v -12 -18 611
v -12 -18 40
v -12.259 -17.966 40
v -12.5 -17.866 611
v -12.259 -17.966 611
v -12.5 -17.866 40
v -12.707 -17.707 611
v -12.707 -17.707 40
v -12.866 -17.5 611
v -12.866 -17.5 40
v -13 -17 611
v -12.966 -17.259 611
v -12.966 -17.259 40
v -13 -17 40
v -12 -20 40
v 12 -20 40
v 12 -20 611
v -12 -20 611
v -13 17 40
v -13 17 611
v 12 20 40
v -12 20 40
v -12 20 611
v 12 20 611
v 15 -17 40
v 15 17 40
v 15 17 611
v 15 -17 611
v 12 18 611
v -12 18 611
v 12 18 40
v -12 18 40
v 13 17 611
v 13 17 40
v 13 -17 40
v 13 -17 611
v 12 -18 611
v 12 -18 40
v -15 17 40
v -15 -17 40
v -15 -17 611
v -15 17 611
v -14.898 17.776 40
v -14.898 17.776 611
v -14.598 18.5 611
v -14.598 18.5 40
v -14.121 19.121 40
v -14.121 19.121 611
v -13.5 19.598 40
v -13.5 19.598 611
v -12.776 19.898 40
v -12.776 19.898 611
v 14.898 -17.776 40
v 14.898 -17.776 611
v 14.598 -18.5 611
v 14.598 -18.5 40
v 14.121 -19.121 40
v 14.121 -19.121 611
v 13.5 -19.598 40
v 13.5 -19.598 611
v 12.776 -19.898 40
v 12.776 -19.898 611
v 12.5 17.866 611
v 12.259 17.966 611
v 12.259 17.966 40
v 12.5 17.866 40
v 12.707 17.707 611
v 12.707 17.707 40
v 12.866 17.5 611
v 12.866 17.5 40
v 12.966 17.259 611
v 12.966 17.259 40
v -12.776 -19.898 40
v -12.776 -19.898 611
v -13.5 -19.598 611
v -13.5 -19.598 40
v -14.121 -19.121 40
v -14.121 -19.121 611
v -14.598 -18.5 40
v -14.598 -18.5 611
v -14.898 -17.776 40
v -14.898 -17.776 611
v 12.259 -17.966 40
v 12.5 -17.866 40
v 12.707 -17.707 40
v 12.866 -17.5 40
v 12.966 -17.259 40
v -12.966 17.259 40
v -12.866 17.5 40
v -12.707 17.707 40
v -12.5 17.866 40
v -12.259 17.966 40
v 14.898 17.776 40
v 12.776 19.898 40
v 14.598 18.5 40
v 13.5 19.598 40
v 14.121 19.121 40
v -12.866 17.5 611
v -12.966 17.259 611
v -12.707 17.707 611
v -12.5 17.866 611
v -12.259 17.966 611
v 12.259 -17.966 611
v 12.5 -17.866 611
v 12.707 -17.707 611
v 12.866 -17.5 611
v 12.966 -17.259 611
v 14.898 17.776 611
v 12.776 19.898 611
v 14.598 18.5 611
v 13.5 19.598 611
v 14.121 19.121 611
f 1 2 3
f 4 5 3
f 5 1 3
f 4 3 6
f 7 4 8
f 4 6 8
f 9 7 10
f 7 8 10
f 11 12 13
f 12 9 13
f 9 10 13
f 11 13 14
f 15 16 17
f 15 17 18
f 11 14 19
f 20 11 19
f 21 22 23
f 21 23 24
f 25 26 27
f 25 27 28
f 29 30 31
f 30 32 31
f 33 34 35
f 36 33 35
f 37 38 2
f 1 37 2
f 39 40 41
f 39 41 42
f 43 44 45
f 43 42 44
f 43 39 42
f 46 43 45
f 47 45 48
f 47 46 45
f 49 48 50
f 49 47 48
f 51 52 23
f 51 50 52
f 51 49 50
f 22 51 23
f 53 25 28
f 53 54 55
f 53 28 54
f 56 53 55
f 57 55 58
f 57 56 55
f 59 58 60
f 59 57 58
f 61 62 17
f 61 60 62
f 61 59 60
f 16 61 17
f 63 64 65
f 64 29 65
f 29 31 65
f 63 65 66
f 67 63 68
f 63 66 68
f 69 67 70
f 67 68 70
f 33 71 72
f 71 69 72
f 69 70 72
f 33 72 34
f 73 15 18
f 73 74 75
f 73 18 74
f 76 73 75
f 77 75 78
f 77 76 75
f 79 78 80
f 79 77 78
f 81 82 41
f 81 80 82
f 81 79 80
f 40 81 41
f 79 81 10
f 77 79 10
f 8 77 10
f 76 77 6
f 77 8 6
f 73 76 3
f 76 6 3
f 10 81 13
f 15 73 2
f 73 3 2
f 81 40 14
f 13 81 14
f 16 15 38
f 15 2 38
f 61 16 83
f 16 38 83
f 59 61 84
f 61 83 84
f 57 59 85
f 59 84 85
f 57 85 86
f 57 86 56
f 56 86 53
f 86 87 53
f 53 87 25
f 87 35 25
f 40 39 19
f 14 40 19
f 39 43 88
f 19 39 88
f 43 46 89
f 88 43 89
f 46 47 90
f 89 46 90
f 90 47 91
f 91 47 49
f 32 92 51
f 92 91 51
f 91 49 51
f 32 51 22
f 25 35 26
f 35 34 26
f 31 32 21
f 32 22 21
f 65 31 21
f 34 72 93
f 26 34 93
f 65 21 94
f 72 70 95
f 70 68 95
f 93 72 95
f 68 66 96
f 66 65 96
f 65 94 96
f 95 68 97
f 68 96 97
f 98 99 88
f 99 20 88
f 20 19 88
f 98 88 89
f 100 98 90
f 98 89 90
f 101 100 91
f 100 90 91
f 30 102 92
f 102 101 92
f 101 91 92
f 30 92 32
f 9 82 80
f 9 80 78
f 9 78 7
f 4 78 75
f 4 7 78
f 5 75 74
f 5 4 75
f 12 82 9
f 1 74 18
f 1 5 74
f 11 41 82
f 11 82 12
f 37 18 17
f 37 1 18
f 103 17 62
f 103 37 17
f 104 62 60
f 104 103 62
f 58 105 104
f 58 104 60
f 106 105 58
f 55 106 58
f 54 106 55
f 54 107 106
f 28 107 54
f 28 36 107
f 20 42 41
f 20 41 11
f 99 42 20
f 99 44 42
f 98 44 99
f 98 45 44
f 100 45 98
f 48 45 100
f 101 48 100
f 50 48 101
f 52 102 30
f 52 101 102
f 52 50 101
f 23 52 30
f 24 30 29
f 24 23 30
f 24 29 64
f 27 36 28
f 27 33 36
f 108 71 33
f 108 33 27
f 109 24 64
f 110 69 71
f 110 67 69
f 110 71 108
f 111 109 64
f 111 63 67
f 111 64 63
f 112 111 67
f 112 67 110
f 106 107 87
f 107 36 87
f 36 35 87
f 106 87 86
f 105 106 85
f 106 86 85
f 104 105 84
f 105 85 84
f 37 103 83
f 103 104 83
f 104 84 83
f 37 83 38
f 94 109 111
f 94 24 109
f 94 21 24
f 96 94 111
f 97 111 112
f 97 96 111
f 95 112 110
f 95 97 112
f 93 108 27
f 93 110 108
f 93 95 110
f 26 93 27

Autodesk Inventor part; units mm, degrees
ref_plane "Start plane" through (0, 0, 40) normal (0, 0, 1) x (1, 0, 0)
ref_plane "End plane" through (0, 0, 611) normal (0, 0, 1) x (1, 0, 0)
sketch "Sketch" plane through (0, 0, 0) normal (0, 0, 1) x (1, 0, 0)
  line L0 (-15, -17) -> (-15, 17)
  line L1 (-12, 20) -> (12, 20)
  line L2 (15, 17) -> (15, -17)
  line L3 (12, -20) -> (-12, -20)
  arc A0 (-15, -17) -> (-12, -20) centre (-12, -17) ccw
  arc A1 (-12, 20) -> (-15, 17) centre (-12, 17) ccw
  arc A2 (15, 17) -> (12, 20) centre (12, 17) ccw
  arc A3 (12, -20) -> (15, -17) centre (12, -17) ccw
  arc A4 (-12, 18) -> (-13, 17) centre (-12, 17) ccw
  line L4 (-12, 18) -> (12, 18)
  arc A5 (13, 17) -> (12, 18) centre (12, 17) ccw
  line L5 (13, 17) -> (13, -17)
  arc A6 (12, -18) -> (13, -17) centre (12, -17) ccw
  line L6 (12, -18) -> (-12, -18)
  arc A7 (-13, -17) -> (-12, -18) centre (-12, -17) ccw
  line L7 (-13, -17) -> (-13, 17)
  line L8 (0, 28.8698) -> (0, -28.8698) construction
  line L9 (-14.8698, 0) -> (14.8698, 0) construction
  dimension "d7" = 3
  dimension "d10" = 40
  dimension "d11" = 30
  dimension "d12" = 2
  dimension "d15" = 20
  dimension "d16" = 15
extrude "Body" add sketch "Sketch" along normal up to surface (571 mm away) from surface at 40
sketch "Sketch3" plane through (0, 0, 0) normal (0, 0, 1) x (1, 0, 0)
  line L0 (0, 0) -> (10, 0)
ref_plane "Work Plane3" through (0, 0, 0) normal (0, -1, 0) x (1, 0, 0)
sketch "Sketch4" plane through (0, 0, 0) normal (0, -1, 0) x (1, 0, 0)
  line L0 (-2, 40) -> (12, 40)
  line L1 (-2, 611) -> (12, 611)
  dimension "d18" = 571
ref_plane "Work Plane4" through (7, -310, 40) normal (0, 0, -1) x (-1, 0, 0)
split "Split1" plane through (7, -310, 40) removes the side toward (0, 0, -1)
ref_plane "Work Plane5" through (-37, -100, 611) normal (0, 0, 1) x (1, 0, 0)
split "Split2" plane through (-37, -100, 611) removes the side toward (0, 0, 1)
equation "\"d7\" = G_IR"
equation "\"d10\" = G_H"
equation "\"d11\" = G_W"
equation "\"d12\" = G_T"
equation "\"d15\" = 0.5 * d10"
equation "\"d16\" = 0.5 * d11"
equation "\"d3\" = G_L"
equation "\"G_W\" = 30"
equation "\"G_H\" = 40"
equation "\"G_T\" = 2"
equation "\"G_IR\" = 3"
equation "\"G_L\" = d18"
equation "\"G_OFFSET_START\" = -40"
equation "\"G_OFFSET_END\" = -40"
equation "\"d13\" = -G_OFFSET_START"
equation "\"d14\" = G_OFFSET_END + B_L"
equation "\"B_L\" = 651"
properties part number "UNI EN 10305-5 - 40 x 30 x 2  - 571" material "Steel, Mild"
